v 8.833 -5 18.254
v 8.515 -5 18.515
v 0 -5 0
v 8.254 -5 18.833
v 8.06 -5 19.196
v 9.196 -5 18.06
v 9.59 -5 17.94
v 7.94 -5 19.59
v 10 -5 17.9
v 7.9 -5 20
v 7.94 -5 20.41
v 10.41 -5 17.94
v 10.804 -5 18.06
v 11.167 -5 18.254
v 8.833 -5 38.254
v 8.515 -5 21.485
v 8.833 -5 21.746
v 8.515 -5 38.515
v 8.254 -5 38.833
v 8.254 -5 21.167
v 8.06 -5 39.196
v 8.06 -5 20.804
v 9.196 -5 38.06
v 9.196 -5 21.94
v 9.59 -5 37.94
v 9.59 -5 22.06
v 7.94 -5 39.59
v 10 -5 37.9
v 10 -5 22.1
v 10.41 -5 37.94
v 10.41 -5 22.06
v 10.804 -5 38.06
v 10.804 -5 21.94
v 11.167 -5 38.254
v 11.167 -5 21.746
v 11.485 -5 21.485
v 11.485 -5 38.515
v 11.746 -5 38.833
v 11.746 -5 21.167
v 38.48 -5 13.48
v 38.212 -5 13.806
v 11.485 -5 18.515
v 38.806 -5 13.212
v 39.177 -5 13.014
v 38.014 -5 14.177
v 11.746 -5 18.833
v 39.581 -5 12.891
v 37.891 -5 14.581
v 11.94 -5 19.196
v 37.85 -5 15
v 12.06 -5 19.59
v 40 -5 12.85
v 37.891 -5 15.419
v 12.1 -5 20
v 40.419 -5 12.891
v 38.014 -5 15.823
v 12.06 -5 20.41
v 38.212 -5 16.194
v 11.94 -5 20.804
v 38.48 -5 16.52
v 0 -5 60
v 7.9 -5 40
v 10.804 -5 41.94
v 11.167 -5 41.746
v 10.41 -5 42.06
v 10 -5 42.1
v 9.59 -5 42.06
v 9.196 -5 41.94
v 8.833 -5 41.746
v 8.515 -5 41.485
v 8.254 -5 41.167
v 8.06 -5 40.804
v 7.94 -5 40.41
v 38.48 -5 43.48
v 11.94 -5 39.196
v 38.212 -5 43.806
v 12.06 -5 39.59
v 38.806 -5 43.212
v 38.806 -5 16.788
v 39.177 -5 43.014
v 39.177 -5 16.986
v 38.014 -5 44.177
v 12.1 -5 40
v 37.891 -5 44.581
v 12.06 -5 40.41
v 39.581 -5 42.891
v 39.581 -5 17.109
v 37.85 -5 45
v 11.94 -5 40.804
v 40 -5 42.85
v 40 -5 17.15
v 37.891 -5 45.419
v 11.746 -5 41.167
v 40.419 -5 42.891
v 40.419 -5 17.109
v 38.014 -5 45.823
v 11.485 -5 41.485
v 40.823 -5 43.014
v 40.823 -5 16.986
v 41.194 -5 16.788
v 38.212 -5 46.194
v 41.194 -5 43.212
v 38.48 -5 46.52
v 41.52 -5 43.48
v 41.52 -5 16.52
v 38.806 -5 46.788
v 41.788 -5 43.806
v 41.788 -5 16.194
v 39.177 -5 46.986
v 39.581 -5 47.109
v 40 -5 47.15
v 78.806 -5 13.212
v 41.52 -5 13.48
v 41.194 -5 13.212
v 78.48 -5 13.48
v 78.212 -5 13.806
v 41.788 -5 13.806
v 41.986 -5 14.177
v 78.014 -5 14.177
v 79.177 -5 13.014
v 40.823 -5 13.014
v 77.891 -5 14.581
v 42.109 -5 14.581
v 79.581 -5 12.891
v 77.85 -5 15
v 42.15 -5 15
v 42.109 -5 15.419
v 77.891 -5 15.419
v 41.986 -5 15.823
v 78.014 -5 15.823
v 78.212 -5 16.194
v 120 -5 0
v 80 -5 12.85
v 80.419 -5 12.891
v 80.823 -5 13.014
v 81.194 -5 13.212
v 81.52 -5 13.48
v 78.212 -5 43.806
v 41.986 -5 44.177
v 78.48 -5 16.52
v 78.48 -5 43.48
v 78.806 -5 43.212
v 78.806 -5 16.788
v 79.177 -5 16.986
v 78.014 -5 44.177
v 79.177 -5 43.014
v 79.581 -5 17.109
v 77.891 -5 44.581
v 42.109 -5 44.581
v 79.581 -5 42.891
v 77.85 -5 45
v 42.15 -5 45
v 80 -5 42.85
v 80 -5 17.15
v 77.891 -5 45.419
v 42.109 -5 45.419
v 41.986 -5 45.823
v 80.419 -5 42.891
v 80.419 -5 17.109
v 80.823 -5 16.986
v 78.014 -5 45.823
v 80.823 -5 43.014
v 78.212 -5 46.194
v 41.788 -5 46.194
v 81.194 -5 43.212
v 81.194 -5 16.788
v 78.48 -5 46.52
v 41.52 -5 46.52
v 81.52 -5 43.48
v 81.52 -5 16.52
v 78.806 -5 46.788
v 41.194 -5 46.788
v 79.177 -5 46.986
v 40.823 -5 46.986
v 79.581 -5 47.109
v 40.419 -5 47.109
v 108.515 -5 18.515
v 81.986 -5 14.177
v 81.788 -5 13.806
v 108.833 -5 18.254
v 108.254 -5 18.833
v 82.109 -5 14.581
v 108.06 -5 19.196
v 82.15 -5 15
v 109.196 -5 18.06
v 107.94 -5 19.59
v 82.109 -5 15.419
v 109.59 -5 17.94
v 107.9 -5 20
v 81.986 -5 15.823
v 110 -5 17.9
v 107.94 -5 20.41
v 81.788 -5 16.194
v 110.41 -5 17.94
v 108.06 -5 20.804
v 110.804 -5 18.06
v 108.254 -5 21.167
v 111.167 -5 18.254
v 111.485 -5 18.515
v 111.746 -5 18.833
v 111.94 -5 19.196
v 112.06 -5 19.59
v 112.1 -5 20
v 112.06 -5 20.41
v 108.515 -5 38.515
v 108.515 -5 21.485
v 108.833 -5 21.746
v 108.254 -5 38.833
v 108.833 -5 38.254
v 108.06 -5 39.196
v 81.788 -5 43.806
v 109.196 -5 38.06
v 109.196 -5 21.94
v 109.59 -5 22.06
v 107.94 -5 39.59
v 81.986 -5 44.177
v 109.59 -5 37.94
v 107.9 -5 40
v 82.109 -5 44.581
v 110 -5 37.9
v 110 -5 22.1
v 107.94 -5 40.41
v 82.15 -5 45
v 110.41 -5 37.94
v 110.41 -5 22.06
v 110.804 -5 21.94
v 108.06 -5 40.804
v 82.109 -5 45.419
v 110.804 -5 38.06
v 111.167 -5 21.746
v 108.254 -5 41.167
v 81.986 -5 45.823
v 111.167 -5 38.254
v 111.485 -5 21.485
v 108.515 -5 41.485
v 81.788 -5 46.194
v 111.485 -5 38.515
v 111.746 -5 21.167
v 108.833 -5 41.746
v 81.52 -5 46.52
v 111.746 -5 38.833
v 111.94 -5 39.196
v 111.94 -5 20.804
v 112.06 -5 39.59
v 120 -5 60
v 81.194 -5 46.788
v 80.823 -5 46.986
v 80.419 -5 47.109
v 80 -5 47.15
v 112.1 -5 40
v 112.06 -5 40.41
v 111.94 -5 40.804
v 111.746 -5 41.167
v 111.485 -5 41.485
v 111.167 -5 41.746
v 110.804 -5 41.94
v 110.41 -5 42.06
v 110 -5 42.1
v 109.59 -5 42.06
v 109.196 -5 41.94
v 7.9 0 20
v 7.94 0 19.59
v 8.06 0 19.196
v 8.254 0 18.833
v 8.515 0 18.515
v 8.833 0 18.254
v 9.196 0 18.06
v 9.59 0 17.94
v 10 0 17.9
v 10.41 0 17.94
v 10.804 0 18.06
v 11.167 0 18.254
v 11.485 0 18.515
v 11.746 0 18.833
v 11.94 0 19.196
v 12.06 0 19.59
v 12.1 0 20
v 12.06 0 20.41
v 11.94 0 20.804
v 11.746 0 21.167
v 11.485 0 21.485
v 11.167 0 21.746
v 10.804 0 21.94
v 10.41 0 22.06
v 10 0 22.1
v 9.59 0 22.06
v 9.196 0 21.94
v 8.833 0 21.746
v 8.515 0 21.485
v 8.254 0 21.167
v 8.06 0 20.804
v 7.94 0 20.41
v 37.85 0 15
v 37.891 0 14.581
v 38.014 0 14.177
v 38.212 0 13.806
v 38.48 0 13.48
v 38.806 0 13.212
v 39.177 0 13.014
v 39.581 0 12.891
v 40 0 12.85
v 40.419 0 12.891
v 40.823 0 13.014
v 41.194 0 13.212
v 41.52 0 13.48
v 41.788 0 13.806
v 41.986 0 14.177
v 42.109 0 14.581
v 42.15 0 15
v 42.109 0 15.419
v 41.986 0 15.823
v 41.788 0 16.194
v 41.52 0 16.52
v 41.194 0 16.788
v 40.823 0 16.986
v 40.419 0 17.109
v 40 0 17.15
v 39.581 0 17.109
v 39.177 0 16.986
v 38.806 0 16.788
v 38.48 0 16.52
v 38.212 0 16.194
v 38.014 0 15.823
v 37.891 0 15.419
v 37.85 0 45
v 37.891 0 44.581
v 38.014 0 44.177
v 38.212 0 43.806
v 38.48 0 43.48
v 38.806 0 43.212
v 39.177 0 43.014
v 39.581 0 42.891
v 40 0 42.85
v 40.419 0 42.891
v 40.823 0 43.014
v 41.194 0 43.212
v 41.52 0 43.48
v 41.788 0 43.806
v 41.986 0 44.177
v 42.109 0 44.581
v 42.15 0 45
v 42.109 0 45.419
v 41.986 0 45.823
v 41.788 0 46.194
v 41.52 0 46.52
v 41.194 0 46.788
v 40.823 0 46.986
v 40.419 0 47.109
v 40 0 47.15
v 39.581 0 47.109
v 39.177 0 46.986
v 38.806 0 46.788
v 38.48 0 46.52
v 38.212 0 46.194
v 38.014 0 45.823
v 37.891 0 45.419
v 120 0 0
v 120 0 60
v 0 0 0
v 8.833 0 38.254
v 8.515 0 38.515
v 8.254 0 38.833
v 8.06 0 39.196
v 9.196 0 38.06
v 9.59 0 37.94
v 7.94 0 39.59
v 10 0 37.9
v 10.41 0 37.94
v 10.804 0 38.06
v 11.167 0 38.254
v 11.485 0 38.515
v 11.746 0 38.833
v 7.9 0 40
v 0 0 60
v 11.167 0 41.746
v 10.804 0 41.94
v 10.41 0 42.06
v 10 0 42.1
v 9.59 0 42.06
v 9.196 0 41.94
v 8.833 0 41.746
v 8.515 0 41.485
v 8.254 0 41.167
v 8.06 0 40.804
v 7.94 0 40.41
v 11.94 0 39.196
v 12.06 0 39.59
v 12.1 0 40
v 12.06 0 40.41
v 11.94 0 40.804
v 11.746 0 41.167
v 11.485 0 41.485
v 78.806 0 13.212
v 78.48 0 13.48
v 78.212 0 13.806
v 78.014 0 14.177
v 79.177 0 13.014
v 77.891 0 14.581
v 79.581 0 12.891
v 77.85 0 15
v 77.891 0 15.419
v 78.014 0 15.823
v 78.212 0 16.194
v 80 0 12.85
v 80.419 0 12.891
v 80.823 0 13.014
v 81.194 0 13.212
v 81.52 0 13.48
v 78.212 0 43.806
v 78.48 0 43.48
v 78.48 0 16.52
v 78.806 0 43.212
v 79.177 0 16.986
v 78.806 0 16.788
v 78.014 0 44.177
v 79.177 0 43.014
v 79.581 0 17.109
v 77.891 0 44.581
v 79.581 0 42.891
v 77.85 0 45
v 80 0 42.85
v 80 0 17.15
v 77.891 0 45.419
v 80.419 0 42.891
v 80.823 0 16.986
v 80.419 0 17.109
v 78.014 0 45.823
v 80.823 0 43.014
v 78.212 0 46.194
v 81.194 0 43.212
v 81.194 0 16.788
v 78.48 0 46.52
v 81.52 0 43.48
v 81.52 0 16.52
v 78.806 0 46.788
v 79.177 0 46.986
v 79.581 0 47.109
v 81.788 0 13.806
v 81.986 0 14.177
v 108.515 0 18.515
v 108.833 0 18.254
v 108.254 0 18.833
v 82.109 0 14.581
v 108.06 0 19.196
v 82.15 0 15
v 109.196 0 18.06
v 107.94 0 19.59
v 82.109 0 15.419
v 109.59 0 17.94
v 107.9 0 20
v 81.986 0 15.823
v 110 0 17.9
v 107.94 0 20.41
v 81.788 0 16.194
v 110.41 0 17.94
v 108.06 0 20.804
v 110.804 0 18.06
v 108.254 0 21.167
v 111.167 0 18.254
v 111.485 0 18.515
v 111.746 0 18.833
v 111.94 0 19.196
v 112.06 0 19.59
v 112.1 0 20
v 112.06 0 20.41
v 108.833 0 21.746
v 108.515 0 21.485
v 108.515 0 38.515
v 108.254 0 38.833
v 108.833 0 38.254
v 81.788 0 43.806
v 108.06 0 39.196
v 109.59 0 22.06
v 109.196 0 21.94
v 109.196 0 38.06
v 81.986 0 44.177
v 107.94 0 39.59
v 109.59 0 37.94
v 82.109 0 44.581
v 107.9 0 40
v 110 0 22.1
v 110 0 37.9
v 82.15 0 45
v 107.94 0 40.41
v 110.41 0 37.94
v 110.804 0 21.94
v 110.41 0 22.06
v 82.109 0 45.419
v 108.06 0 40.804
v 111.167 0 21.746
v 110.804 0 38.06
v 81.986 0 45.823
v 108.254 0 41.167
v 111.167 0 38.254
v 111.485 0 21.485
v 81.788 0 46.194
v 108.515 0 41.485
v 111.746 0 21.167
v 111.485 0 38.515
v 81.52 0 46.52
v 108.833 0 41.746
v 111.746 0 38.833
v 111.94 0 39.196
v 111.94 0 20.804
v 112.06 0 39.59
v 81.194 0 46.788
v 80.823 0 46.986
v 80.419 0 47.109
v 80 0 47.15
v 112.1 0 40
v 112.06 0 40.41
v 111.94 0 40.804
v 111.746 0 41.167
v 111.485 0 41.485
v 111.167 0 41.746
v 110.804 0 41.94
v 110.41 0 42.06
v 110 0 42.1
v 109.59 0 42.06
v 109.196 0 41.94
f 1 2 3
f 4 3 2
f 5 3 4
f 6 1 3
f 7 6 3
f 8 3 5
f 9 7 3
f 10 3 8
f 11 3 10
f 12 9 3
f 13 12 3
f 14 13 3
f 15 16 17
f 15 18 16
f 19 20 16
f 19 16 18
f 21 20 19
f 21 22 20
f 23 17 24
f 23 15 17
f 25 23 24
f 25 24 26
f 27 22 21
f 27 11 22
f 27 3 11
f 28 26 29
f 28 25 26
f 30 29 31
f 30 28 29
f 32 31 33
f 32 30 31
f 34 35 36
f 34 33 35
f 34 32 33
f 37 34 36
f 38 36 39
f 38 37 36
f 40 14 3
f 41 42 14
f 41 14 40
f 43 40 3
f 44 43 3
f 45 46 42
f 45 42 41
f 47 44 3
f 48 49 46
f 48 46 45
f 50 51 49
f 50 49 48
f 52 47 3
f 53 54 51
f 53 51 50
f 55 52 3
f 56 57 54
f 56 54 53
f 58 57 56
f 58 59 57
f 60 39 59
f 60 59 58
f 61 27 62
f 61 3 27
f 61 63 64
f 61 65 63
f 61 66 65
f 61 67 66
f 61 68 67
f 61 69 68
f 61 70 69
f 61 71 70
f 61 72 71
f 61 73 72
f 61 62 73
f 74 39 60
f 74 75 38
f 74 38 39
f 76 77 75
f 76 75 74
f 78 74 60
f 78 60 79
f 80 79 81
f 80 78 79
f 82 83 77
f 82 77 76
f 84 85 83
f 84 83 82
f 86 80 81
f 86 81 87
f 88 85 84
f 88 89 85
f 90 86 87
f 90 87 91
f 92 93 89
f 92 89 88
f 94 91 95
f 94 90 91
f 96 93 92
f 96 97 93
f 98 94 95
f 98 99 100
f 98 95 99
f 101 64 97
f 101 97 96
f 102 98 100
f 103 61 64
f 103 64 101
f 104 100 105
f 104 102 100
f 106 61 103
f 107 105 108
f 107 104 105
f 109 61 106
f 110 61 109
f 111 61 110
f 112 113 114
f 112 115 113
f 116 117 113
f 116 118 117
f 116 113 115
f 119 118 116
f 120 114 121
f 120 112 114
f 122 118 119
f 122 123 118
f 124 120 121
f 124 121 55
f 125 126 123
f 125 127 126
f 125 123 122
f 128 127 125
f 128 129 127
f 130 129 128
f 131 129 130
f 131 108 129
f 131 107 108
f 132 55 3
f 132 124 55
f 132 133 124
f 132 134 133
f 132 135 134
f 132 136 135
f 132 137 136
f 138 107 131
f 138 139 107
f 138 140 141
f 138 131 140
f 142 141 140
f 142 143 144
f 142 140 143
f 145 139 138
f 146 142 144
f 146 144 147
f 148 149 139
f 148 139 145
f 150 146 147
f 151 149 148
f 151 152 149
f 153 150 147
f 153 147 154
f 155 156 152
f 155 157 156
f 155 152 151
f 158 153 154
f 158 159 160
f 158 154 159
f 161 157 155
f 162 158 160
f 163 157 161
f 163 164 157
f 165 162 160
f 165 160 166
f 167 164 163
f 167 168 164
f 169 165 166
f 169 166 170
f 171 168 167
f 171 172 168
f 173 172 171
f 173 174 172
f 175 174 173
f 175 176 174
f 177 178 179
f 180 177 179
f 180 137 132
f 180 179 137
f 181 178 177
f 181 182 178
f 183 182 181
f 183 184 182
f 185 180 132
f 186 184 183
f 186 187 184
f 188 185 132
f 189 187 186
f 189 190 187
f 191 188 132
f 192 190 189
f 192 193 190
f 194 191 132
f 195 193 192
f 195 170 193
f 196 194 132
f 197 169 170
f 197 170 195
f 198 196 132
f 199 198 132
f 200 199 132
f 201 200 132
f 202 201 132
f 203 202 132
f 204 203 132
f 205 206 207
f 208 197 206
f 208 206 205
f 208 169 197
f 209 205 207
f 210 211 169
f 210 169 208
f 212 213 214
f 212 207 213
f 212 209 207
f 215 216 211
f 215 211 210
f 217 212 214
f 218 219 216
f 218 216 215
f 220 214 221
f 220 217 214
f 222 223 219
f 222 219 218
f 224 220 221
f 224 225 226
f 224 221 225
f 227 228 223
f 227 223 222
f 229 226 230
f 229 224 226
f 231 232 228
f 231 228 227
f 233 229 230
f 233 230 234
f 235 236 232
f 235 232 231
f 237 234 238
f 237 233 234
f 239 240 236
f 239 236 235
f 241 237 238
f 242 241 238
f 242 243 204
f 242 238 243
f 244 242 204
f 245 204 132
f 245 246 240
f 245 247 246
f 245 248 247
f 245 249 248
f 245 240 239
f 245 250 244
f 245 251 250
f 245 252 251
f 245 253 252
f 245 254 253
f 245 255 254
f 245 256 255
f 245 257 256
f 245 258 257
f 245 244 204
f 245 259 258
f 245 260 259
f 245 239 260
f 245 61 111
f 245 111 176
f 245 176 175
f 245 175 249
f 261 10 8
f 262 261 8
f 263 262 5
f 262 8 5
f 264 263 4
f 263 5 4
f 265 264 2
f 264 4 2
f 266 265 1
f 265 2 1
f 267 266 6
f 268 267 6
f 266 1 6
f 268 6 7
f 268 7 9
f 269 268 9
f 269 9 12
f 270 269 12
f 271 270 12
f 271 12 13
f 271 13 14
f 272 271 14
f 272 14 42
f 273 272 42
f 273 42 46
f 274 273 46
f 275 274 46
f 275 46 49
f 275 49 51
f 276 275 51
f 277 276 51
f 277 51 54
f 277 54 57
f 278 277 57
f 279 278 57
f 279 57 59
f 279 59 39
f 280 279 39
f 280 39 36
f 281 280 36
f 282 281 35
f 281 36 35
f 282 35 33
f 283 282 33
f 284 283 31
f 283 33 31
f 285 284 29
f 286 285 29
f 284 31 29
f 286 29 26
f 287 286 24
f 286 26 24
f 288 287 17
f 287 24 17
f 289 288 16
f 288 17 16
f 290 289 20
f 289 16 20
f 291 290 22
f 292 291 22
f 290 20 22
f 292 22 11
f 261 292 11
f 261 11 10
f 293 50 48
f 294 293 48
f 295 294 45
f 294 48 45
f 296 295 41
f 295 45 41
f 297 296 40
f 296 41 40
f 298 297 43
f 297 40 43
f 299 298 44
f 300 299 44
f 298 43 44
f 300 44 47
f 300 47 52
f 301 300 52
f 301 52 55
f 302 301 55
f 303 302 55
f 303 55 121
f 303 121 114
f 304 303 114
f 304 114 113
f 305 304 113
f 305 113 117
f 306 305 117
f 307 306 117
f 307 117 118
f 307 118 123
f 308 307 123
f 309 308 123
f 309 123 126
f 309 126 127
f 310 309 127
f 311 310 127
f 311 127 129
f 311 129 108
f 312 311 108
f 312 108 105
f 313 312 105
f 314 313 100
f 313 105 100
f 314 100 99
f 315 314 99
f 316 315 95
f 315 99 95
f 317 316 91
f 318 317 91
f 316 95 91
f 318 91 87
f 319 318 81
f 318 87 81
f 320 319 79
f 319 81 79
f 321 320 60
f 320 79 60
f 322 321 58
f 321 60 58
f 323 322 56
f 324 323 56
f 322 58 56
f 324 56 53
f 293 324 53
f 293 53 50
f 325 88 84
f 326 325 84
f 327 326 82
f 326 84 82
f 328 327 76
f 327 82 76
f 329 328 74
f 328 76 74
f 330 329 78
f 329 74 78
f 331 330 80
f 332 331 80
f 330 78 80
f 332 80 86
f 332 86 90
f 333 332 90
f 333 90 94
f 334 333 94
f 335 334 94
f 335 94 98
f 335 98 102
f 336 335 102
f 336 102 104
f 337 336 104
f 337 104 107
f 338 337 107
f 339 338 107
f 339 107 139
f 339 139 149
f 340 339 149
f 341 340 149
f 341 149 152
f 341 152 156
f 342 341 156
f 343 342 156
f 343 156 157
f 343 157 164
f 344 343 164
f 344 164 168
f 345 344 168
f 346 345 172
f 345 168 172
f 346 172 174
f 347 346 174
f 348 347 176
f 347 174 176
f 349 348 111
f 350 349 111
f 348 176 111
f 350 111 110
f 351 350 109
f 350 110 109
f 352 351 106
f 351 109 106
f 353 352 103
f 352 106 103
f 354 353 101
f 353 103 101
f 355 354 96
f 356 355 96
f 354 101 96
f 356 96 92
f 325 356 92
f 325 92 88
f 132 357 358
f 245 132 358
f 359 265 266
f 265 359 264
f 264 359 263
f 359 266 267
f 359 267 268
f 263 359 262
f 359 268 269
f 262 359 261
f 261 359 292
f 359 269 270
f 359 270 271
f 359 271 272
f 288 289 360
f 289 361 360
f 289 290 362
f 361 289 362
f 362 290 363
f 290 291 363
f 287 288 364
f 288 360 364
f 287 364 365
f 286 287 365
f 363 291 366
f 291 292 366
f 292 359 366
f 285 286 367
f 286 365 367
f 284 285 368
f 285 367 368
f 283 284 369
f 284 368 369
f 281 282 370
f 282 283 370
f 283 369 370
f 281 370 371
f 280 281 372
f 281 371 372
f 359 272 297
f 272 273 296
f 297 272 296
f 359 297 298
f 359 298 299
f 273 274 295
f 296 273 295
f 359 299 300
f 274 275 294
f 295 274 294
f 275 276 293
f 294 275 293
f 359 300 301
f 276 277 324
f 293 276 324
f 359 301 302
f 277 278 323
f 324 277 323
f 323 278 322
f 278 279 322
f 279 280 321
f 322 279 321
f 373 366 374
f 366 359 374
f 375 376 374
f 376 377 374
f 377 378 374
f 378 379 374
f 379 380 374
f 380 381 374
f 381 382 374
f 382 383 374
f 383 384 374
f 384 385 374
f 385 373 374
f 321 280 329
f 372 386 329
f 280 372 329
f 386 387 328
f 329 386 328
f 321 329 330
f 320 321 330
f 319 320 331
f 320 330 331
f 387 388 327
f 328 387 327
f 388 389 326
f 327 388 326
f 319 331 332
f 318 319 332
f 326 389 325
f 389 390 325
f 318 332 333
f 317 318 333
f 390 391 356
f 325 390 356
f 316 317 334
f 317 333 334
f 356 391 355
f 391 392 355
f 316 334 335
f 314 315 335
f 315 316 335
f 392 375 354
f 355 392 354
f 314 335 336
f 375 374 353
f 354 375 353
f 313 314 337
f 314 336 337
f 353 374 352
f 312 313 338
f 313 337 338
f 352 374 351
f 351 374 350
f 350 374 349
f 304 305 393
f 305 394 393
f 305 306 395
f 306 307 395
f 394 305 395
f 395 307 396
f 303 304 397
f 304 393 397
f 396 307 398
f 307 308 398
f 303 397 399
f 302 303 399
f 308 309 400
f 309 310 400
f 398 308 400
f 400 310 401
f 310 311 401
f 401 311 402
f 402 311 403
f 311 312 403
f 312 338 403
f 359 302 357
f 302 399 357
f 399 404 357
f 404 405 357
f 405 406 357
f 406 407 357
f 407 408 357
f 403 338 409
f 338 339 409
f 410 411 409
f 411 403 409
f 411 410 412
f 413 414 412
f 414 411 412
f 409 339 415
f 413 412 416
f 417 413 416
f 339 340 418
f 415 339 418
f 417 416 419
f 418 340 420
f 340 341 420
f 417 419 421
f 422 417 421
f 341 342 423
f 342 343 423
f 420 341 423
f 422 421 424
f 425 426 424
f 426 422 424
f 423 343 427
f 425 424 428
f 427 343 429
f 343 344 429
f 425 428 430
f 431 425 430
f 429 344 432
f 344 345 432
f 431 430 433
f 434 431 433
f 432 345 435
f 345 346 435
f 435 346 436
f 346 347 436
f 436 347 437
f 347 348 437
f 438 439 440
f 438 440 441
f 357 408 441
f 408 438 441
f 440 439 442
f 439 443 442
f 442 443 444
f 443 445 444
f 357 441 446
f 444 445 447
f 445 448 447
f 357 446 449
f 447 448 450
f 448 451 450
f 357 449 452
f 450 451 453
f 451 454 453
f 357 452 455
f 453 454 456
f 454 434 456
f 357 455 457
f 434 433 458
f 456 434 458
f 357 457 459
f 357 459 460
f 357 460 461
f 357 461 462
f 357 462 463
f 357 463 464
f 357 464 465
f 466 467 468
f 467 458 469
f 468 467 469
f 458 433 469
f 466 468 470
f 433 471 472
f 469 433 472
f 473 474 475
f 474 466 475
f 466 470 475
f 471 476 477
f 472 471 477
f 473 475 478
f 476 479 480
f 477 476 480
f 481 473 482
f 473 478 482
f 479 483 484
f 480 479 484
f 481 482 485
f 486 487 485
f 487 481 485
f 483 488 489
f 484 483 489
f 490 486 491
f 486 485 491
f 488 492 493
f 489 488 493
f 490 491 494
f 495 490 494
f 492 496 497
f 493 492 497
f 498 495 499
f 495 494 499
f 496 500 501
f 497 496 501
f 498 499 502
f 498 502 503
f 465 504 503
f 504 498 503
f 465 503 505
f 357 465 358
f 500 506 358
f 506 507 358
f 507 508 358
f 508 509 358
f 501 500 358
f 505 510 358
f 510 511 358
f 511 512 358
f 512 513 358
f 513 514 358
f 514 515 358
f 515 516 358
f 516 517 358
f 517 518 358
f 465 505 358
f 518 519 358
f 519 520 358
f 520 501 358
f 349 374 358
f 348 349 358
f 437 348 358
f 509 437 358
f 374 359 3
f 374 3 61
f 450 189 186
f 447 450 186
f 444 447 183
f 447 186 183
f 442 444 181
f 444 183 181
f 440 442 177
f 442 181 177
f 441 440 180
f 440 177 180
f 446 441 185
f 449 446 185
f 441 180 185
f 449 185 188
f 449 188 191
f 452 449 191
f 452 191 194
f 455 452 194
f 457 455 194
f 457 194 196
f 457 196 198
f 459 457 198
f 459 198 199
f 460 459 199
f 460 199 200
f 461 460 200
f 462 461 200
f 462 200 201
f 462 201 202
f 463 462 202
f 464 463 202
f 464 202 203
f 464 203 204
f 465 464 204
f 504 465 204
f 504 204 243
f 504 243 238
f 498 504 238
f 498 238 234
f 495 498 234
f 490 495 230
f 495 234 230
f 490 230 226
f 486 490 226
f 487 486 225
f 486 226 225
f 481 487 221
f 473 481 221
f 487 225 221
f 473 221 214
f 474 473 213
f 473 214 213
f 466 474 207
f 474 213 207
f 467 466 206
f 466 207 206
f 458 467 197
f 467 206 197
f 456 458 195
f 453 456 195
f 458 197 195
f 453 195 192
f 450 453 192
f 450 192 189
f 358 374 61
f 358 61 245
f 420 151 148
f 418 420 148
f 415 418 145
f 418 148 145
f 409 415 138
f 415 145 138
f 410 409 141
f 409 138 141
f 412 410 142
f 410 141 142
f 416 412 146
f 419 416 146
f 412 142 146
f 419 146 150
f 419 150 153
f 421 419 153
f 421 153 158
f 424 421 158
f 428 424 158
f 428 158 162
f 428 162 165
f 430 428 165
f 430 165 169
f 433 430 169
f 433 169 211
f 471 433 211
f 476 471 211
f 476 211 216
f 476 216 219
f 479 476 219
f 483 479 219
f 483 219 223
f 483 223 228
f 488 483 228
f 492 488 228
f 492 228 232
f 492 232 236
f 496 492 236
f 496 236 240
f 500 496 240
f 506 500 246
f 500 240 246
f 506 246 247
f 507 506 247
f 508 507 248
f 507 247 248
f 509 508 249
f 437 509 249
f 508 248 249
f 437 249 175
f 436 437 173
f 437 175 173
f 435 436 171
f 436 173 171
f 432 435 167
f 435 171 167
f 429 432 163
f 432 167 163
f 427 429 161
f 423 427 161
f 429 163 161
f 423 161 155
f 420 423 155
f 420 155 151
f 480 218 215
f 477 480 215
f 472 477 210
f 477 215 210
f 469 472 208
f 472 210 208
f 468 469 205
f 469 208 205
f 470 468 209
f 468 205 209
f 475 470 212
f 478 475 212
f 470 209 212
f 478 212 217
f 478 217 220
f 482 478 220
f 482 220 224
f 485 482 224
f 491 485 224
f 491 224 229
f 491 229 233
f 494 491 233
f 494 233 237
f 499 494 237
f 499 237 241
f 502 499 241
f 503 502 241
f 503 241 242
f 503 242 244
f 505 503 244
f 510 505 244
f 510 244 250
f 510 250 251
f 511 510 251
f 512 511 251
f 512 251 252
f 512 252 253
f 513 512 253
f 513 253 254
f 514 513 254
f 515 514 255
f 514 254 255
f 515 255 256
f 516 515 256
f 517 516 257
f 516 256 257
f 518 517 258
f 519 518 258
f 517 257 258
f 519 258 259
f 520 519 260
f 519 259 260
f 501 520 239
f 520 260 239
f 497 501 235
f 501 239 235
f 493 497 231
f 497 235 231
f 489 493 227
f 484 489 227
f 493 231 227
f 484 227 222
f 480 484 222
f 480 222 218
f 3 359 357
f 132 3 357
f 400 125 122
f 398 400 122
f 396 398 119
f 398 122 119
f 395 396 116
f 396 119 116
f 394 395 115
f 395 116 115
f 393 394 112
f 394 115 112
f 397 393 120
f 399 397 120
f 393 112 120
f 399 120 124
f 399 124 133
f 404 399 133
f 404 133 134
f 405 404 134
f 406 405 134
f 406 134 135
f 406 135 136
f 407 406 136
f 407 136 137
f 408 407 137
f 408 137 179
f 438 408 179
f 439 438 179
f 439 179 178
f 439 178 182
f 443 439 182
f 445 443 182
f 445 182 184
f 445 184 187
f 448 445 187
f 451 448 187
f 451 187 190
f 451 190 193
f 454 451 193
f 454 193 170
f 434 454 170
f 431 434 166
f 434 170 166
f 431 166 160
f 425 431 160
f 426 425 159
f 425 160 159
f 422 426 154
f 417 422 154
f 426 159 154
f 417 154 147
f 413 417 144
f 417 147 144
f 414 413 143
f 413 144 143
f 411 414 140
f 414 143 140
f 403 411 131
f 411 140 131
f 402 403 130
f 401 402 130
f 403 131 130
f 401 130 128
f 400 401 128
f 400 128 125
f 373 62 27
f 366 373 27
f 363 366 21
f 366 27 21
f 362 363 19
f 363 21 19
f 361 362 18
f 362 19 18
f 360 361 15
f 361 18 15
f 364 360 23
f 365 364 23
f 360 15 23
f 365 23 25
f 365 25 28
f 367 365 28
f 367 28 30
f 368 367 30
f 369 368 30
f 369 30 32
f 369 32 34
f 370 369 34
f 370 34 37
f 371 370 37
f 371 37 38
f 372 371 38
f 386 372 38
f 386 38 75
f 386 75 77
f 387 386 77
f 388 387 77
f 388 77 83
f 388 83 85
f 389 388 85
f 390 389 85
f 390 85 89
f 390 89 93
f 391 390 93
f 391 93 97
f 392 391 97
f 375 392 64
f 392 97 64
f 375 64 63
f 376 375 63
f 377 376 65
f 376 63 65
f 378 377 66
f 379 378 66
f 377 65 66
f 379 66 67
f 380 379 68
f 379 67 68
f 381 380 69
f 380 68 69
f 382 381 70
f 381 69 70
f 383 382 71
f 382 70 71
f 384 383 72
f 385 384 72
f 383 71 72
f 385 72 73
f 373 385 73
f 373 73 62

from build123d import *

# Parameters (mm, degrees)
F0_W     = 120
F0_H     = 60
F1_DEPTH = 5
F3_D     = 4.2
F5_D     = 4.3


with BuildPart() as f1:
    # F0 (on Front) → F1 (new body)
    with BuildSketch(Plane.XZ):
        with Locations((60, 30)):
            Rectangle(F0_W, F0_H)
    extrude(amount=F1_DEPTH)

    # F3 (through all)
    with Locations(Plane(origin=(0, 0, 0), x_dir=(1, 0, 0), z_dir=(0, 1, 0))):
        with Locations((10, -40), (10, -20), (110, -20), (110, -40)):
            Hole(F3_D / 2)

    # F5 (through all)
    with Locations(Plane(origin=(0, 0, 0), x_dir=(1, 0, 0), z_dir=(0, 1, 0))):
        with Locations((40, -45), (40, -15), (80, -15), (80, -45)):
            Hole(F5_D / 2)


solid = f1.part
